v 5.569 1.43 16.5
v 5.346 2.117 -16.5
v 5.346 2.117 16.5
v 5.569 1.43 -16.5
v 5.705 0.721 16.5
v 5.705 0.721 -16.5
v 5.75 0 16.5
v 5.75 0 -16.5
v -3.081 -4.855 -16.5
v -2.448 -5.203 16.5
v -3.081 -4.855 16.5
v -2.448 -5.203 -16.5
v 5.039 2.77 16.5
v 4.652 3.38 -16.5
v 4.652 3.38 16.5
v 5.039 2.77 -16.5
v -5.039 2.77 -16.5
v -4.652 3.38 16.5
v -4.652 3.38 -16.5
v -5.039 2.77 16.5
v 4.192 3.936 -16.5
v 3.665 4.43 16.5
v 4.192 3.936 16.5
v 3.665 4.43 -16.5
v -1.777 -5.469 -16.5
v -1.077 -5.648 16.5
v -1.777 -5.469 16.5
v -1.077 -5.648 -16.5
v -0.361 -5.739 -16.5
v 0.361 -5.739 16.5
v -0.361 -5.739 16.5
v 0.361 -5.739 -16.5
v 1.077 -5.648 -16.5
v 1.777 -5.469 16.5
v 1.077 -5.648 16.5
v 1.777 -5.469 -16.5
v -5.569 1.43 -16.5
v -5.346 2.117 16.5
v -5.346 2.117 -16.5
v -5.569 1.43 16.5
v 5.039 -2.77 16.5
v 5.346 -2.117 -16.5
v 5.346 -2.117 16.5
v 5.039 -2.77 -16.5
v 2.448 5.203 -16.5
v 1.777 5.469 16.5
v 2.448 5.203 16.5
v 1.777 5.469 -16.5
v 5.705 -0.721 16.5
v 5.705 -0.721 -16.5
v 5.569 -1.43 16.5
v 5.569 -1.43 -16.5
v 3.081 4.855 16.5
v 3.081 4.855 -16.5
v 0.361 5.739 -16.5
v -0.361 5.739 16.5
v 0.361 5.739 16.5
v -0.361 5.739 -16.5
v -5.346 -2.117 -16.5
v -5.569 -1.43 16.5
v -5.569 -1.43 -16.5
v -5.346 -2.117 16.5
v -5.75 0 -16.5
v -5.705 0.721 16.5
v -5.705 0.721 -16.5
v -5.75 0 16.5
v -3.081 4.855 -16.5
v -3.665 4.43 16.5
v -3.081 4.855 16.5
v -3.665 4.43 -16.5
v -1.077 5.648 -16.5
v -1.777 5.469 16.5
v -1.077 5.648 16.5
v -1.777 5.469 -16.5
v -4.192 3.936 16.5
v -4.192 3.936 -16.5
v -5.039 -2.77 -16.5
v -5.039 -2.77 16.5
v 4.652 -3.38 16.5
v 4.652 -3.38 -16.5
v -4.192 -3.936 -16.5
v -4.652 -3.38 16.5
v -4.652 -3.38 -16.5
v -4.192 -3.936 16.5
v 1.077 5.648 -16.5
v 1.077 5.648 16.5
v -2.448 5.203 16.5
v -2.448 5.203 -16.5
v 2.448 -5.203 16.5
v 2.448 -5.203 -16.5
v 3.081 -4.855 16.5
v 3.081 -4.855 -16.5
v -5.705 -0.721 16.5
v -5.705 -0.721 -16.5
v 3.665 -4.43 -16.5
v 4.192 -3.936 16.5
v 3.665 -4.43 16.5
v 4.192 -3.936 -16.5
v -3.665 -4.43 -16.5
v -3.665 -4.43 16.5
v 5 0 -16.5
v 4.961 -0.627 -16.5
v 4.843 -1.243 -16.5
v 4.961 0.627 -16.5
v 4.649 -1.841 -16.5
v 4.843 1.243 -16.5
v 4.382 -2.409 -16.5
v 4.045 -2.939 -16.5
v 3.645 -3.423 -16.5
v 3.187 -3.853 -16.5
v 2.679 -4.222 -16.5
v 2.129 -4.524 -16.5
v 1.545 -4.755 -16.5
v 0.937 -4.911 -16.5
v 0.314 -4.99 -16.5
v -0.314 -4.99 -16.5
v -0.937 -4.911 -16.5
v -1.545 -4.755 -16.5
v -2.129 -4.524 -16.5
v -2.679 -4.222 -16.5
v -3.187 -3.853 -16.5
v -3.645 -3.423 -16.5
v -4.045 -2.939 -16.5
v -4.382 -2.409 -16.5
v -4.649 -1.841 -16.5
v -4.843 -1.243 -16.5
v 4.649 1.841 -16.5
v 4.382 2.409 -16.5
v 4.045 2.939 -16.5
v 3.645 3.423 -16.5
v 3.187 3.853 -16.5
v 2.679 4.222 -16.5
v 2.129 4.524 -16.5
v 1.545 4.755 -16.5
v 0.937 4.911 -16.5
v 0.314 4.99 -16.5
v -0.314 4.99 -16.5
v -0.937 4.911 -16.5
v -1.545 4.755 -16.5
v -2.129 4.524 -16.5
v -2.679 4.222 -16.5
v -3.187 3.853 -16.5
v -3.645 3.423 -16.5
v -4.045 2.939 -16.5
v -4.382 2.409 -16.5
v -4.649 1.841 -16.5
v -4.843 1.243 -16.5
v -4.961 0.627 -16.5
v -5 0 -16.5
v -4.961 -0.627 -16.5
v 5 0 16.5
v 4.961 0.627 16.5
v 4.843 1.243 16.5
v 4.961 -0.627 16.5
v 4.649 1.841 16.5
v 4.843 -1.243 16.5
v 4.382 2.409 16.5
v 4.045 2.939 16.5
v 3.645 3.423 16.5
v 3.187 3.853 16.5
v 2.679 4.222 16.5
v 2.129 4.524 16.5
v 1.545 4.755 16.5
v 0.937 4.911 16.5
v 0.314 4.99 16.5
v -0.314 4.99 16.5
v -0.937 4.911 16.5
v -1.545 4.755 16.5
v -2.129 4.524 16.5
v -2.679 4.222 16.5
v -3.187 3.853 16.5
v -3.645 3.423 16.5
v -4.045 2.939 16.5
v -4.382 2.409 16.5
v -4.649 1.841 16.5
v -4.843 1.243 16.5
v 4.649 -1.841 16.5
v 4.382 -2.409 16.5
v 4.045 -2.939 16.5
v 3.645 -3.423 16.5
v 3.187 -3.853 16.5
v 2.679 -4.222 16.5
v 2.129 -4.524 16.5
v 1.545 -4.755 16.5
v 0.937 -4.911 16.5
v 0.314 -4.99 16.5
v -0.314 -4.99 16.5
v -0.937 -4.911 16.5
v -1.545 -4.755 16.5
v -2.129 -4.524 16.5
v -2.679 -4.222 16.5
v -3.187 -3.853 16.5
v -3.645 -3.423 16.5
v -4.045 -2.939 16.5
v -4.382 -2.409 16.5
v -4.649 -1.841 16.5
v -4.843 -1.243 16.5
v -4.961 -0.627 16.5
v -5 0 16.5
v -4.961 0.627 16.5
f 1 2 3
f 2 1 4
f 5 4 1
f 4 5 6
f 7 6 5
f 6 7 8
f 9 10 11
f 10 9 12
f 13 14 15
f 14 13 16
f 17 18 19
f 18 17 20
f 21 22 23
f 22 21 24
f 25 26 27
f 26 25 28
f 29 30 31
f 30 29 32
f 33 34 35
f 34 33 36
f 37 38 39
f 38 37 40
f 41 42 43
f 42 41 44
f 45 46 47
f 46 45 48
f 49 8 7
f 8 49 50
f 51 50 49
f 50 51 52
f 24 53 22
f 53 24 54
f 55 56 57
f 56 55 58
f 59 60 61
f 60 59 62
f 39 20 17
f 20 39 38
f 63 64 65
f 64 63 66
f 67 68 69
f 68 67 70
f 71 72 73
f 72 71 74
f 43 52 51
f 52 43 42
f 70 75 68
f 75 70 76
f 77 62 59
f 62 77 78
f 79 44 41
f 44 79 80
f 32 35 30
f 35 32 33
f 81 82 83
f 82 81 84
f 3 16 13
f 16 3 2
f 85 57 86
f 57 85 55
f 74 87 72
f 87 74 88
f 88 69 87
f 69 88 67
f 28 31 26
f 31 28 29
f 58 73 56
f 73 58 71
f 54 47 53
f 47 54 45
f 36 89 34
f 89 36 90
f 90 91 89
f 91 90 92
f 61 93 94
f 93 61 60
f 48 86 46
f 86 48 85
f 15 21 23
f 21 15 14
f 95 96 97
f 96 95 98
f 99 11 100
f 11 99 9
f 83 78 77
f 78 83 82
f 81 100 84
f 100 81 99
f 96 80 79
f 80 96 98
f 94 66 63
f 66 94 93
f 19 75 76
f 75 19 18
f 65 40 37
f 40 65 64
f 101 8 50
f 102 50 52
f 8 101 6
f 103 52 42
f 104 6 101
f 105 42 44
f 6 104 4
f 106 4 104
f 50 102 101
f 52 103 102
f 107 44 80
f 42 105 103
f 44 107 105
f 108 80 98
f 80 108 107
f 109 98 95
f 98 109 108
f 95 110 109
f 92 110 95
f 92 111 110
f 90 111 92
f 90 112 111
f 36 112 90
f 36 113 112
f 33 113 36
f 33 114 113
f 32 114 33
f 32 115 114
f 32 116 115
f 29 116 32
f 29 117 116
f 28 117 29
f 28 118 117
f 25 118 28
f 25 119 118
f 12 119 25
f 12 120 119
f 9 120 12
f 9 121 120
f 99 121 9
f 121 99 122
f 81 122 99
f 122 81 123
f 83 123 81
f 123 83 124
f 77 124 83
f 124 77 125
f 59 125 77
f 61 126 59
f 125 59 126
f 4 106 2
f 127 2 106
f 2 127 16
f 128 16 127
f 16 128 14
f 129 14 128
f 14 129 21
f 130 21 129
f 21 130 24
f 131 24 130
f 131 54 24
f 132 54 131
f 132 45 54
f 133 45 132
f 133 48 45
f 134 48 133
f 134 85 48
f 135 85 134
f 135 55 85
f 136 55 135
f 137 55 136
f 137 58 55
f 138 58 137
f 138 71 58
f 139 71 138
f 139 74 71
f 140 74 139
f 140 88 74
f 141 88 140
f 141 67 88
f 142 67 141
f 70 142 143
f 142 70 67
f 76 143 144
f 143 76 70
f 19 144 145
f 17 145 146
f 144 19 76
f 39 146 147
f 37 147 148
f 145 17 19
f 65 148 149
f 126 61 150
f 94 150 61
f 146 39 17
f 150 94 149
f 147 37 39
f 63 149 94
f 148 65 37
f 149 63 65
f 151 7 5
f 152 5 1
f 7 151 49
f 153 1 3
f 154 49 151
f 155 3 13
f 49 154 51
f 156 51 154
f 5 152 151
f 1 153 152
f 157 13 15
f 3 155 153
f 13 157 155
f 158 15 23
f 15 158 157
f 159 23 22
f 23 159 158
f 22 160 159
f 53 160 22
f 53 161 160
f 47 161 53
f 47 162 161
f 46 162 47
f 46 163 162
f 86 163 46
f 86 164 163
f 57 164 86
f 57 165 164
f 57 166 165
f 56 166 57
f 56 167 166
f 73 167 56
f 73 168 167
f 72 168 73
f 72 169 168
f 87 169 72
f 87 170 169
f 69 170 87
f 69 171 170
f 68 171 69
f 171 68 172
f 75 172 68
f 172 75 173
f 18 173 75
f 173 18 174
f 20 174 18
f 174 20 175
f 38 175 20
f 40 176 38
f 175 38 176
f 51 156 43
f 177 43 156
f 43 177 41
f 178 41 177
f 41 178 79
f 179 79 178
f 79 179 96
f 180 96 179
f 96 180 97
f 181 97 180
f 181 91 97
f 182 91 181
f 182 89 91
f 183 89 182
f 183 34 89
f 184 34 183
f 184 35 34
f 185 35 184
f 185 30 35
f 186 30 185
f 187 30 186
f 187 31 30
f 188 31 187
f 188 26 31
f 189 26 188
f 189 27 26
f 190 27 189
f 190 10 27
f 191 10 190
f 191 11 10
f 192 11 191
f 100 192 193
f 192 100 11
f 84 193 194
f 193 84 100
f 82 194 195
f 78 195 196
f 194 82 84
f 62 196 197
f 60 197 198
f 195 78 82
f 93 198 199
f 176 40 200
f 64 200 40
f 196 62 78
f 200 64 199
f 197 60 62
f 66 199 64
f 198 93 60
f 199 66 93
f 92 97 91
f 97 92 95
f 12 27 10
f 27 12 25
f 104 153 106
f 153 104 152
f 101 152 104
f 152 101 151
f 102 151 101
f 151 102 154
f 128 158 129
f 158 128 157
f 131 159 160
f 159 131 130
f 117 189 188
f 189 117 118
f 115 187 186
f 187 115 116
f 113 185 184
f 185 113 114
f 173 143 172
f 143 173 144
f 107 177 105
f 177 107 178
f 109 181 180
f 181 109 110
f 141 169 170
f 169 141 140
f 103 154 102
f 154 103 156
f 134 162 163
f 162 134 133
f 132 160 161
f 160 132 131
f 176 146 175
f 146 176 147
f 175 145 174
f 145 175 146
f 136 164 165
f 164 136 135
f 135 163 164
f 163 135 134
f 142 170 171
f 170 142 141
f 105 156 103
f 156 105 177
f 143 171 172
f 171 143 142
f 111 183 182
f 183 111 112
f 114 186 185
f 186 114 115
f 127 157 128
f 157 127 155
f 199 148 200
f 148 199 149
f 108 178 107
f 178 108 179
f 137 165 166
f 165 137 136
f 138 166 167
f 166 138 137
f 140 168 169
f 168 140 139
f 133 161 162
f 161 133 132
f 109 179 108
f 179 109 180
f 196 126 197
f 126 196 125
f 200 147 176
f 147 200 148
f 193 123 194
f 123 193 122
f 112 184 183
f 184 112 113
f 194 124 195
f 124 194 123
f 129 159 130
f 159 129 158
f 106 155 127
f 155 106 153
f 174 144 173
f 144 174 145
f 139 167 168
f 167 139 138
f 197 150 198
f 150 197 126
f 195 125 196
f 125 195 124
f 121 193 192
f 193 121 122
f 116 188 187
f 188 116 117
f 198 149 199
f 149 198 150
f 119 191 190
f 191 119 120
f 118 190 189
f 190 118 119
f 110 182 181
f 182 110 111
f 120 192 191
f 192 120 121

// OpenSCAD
$fn = 50;


difference() {
	union() {
		translate(v = [0, 0, -16.5000000000]) {
			cylinder(h = 33, r = 5.7500000000);
		}
	}
	union() {
		translate(v = [0, 0, -100.0000000000]) {
			cylinder(h = 200, r = 5.0000000000);
		}
	}
}
